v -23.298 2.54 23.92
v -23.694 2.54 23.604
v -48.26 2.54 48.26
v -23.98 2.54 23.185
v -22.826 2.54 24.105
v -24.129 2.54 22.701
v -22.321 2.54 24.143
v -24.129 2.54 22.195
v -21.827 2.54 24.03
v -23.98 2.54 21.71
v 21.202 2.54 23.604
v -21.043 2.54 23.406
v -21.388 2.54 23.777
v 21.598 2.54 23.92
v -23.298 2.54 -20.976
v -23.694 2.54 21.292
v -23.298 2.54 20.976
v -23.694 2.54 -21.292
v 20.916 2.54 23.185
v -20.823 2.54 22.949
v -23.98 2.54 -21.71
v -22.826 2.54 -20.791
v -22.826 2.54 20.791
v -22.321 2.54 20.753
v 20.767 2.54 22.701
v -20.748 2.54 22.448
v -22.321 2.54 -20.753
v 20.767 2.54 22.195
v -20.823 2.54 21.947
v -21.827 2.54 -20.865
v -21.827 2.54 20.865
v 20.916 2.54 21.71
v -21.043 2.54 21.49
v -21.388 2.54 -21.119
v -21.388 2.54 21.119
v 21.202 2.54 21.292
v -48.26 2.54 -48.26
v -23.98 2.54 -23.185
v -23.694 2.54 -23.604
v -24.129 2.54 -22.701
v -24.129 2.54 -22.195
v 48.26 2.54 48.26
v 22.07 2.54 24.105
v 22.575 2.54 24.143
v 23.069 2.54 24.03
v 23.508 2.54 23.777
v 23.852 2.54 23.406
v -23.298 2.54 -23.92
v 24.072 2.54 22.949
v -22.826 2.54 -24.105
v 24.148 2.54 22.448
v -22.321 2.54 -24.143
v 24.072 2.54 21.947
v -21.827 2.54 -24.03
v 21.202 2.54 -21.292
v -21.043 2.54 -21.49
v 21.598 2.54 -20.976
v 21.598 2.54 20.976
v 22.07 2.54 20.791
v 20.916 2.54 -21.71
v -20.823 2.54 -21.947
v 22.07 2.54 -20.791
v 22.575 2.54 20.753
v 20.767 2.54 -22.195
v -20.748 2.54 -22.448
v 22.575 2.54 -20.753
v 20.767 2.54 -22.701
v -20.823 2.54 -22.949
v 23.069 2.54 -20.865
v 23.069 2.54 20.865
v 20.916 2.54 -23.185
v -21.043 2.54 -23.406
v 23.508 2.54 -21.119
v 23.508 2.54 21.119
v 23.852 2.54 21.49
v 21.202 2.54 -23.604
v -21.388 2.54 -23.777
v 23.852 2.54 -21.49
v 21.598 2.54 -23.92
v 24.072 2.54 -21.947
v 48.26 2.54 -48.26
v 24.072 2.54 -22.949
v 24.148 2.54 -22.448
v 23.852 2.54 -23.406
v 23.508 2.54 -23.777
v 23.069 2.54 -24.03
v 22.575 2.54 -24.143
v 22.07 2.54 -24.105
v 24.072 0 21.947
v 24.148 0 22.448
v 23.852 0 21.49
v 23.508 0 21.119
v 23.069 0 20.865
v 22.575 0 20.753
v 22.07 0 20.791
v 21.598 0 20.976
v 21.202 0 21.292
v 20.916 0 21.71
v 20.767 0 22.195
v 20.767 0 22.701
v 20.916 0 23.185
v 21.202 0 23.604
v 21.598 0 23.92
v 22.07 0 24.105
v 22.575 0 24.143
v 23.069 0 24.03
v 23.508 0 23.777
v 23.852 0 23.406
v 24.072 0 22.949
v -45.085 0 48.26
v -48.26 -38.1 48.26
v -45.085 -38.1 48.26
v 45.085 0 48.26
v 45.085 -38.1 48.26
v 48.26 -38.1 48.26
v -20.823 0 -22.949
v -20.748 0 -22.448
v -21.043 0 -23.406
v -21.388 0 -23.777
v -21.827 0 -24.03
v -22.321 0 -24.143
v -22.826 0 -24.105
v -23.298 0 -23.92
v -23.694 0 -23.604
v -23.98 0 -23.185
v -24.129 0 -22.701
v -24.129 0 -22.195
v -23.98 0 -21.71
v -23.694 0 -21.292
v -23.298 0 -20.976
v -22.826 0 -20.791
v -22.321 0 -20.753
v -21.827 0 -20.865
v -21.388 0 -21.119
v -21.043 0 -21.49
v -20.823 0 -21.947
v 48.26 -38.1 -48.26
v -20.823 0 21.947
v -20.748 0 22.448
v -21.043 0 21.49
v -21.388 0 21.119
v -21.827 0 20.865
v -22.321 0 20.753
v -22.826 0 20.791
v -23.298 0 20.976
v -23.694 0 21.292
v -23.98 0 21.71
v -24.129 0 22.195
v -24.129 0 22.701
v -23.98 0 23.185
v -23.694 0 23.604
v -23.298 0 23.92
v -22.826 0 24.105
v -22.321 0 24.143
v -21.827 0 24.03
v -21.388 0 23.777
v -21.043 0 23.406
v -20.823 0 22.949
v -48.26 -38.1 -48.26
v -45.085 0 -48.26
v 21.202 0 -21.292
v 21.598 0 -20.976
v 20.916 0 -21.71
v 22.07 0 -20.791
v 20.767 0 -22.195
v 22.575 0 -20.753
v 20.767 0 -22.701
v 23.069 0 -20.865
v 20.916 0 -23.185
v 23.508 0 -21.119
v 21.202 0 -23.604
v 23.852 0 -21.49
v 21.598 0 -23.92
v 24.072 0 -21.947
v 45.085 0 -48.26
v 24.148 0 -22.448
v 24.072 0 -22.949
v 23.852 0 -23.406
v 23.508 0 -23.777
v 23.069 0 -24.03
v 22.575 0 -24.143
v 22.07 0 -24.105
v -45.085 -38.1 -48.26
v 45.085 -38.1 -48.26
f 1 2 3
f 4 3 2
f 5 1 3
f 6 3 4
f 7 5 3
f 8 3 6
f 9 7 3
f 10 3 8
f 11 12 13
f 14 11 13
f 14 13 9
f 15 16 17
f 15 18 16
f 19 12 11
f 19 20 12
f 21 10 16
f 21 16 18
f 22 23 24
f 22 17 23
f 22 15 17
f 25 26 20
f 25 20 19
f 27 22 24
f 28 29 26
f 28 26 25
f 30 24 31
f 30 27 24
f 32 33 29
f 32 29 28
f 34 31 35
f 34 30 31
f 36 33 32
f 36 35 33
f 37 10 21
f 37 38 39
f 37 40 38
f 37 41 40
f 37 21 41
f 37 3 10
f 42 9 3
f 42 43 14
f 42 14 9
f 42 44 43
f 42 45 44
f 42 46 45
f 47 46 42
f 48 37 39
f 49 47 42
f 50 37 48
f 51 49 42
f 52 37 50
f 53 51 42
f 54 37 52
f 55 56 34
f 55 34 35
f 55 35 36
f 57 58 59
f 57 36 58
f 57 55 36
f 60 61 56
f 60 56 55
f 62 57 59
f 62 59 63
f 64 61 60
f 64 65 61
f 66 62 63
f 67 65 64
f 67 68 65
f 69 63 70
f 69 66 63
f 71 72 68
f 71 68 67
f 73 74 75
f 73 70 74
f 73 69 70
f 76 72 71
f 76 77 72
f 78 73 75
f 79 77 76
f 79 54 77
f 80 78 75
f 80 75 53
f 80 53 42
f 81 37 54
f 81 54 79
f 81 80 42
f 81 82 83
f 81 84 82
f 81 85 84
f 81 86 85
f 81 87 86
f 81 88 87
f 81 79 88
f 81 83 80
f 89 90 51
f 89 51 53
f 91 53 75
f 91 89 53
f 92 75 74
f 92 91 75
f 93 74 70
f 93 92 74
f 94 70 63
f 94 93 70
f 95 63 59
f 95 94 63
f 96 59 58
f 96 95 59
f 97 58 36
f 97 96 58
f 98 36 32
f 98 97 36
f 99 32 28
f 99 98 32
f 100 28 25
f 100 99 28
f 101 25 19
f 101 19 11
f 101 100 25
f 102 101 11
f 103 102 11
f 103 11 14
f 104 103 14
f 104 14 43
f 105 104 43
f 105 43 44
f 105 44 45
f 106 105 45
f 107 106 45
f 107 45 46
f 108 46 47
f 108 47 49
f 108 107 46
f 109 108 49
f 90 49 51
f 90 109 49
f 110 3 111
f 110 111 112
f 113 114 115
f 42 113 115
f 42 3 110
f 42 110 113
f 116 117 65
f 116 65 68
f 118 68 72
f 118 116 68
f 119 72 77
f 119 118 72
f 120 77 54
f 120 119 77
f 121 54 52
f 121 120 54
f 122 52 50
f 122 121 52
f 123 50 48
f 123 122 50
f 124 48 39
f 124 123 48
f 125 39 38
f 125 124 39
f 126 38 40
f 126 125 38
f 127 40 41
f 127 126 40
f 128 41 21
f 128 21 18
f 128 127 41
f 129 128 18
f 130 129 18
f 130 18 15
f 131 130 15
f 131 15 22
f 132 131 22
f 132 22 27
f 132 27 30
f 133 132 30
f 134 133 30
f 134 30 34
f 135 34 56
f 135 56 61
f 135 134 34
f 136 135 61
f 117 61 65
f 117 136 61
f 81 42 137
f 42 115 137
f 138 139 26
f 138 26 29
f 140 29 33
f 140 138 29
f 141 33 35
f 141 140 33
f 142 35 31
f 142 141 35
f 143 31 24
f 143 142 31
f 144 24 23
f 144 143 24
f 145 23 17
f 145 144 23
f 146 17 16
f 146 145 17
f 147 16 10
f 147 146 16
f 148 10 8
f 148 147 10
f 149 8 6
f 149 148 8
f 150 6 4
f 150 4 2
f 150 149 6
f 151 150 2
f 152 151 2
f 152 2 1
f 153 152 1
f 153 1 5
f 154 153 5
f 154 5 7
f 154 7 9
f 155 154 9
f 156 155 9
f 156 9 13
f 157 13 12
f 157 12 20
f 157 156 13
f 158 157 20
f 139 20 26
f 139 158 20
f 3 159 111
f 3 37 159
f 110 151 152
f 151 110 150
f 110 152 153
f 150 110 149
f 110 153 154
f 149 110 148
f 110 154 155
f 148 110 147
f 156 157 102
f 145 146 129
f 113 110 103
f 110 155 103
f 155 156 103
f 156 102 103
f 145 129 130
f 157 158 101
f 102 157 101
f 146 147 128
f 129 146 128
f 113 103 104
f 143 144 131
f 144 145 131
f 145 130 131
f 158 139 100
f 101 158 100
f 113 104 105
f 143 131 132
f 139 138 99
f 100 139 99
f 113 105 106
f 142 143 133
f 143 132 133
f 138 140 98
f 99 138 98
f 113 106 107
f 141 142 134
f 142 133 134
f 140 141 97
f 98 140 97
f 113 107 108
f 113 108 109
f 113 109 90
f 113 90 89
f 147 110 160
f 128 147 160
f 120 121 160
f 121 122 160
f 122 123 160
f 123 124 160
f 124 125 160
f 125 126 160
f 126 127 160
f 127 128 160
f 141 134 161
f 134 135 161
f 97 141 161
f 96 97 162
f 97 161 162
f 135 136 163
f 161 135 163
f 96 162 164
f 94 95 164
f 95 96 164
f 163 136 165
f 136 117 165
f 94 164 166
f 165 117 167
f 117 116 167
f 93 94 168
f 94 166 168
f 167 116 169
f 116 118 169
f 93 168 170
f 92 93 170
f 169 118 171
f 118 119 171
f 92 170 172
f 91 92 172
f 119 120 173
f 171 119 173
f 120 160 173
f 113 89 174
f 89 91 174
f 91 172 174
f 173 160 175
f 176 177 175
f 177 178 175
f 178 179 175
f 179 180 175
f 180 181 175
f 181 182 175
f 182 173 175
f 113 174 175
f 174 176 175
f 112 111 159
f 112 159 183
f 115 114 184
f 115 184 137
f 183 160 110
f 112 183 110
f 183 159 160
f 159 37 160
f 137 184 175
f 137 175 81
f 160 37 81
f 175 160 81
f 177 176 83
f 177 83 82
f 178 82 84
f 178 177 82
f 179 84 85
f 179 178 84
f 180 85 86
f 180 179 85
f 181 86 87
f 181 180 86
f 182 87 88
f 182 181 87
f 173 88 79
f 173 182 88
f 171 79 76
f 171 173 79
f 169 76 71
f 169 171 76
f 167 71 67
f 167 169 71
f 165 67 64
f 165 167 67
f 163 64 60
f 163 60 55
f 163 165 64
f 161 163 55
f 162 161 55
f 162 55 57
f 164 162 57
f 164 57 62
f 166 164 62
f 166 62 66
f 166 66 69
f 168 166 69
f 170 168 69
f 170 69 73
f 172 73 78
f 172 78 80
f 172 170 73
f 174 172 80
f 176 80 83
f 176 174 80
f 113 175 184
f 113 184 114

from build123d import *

# Parameters (mm, degrees)
SKETCH1_W           = 96.52
SKETCH1_H           = 96.52
SKETCH1_R           = 1.7
BOSS_EXTRUDE1_DEPTH = 2.54
SKETCH2_W           = 3.175
SKETCH2_H           = 96.52
BOSS_EXTRUDE2_DEPTH = 38.1


with BuildPart() as part:
    # Sketch1 → Boss-Extrude1 (new body)
    with BuildSketch(Plane(origin=(0, 0, 0), x_dir=(1, 0, 0), z_dir=(0, 1, 0))):
        Rectangle(SKETCH1_W, SKETCH1_H)
        with Locations((-22.447883068, 22.447883068)):
            Circle(SKETCH1_R, mode=Mode.SUBTRACT)
        with Locations((22.447883068, 22.447883068)):
            Circle(SKETCH1_R, mode=Mode.SUBTRACT)
        with Locations((22.447883068, -22.447883068)):
            Circle(SKETCH1_R, mode=Mode.SUBTRACT)
        with Locations((-22.447883068, -22.447883068)):
            Circle(SKETCH1_R, mode=Mode.SUBTRACT)
    extrude(amount=BOSS_EXTRUDE1_DEPTH)

    # Sketch2 → Boss-Extrude2 (add)
    with BuildSketch(Plane.XZ):
        with Locations((-46.6725, 0)):
            Rectangle(SKETCH2_W, SKETCH2_H)
        with Locations((46.6725, 0)):
            Rectangle(SKETCH2_W, SKETCH2_H)
    extrude(amount=BOSS_EXTRUDE2_DEPTH)


solid = part.part
